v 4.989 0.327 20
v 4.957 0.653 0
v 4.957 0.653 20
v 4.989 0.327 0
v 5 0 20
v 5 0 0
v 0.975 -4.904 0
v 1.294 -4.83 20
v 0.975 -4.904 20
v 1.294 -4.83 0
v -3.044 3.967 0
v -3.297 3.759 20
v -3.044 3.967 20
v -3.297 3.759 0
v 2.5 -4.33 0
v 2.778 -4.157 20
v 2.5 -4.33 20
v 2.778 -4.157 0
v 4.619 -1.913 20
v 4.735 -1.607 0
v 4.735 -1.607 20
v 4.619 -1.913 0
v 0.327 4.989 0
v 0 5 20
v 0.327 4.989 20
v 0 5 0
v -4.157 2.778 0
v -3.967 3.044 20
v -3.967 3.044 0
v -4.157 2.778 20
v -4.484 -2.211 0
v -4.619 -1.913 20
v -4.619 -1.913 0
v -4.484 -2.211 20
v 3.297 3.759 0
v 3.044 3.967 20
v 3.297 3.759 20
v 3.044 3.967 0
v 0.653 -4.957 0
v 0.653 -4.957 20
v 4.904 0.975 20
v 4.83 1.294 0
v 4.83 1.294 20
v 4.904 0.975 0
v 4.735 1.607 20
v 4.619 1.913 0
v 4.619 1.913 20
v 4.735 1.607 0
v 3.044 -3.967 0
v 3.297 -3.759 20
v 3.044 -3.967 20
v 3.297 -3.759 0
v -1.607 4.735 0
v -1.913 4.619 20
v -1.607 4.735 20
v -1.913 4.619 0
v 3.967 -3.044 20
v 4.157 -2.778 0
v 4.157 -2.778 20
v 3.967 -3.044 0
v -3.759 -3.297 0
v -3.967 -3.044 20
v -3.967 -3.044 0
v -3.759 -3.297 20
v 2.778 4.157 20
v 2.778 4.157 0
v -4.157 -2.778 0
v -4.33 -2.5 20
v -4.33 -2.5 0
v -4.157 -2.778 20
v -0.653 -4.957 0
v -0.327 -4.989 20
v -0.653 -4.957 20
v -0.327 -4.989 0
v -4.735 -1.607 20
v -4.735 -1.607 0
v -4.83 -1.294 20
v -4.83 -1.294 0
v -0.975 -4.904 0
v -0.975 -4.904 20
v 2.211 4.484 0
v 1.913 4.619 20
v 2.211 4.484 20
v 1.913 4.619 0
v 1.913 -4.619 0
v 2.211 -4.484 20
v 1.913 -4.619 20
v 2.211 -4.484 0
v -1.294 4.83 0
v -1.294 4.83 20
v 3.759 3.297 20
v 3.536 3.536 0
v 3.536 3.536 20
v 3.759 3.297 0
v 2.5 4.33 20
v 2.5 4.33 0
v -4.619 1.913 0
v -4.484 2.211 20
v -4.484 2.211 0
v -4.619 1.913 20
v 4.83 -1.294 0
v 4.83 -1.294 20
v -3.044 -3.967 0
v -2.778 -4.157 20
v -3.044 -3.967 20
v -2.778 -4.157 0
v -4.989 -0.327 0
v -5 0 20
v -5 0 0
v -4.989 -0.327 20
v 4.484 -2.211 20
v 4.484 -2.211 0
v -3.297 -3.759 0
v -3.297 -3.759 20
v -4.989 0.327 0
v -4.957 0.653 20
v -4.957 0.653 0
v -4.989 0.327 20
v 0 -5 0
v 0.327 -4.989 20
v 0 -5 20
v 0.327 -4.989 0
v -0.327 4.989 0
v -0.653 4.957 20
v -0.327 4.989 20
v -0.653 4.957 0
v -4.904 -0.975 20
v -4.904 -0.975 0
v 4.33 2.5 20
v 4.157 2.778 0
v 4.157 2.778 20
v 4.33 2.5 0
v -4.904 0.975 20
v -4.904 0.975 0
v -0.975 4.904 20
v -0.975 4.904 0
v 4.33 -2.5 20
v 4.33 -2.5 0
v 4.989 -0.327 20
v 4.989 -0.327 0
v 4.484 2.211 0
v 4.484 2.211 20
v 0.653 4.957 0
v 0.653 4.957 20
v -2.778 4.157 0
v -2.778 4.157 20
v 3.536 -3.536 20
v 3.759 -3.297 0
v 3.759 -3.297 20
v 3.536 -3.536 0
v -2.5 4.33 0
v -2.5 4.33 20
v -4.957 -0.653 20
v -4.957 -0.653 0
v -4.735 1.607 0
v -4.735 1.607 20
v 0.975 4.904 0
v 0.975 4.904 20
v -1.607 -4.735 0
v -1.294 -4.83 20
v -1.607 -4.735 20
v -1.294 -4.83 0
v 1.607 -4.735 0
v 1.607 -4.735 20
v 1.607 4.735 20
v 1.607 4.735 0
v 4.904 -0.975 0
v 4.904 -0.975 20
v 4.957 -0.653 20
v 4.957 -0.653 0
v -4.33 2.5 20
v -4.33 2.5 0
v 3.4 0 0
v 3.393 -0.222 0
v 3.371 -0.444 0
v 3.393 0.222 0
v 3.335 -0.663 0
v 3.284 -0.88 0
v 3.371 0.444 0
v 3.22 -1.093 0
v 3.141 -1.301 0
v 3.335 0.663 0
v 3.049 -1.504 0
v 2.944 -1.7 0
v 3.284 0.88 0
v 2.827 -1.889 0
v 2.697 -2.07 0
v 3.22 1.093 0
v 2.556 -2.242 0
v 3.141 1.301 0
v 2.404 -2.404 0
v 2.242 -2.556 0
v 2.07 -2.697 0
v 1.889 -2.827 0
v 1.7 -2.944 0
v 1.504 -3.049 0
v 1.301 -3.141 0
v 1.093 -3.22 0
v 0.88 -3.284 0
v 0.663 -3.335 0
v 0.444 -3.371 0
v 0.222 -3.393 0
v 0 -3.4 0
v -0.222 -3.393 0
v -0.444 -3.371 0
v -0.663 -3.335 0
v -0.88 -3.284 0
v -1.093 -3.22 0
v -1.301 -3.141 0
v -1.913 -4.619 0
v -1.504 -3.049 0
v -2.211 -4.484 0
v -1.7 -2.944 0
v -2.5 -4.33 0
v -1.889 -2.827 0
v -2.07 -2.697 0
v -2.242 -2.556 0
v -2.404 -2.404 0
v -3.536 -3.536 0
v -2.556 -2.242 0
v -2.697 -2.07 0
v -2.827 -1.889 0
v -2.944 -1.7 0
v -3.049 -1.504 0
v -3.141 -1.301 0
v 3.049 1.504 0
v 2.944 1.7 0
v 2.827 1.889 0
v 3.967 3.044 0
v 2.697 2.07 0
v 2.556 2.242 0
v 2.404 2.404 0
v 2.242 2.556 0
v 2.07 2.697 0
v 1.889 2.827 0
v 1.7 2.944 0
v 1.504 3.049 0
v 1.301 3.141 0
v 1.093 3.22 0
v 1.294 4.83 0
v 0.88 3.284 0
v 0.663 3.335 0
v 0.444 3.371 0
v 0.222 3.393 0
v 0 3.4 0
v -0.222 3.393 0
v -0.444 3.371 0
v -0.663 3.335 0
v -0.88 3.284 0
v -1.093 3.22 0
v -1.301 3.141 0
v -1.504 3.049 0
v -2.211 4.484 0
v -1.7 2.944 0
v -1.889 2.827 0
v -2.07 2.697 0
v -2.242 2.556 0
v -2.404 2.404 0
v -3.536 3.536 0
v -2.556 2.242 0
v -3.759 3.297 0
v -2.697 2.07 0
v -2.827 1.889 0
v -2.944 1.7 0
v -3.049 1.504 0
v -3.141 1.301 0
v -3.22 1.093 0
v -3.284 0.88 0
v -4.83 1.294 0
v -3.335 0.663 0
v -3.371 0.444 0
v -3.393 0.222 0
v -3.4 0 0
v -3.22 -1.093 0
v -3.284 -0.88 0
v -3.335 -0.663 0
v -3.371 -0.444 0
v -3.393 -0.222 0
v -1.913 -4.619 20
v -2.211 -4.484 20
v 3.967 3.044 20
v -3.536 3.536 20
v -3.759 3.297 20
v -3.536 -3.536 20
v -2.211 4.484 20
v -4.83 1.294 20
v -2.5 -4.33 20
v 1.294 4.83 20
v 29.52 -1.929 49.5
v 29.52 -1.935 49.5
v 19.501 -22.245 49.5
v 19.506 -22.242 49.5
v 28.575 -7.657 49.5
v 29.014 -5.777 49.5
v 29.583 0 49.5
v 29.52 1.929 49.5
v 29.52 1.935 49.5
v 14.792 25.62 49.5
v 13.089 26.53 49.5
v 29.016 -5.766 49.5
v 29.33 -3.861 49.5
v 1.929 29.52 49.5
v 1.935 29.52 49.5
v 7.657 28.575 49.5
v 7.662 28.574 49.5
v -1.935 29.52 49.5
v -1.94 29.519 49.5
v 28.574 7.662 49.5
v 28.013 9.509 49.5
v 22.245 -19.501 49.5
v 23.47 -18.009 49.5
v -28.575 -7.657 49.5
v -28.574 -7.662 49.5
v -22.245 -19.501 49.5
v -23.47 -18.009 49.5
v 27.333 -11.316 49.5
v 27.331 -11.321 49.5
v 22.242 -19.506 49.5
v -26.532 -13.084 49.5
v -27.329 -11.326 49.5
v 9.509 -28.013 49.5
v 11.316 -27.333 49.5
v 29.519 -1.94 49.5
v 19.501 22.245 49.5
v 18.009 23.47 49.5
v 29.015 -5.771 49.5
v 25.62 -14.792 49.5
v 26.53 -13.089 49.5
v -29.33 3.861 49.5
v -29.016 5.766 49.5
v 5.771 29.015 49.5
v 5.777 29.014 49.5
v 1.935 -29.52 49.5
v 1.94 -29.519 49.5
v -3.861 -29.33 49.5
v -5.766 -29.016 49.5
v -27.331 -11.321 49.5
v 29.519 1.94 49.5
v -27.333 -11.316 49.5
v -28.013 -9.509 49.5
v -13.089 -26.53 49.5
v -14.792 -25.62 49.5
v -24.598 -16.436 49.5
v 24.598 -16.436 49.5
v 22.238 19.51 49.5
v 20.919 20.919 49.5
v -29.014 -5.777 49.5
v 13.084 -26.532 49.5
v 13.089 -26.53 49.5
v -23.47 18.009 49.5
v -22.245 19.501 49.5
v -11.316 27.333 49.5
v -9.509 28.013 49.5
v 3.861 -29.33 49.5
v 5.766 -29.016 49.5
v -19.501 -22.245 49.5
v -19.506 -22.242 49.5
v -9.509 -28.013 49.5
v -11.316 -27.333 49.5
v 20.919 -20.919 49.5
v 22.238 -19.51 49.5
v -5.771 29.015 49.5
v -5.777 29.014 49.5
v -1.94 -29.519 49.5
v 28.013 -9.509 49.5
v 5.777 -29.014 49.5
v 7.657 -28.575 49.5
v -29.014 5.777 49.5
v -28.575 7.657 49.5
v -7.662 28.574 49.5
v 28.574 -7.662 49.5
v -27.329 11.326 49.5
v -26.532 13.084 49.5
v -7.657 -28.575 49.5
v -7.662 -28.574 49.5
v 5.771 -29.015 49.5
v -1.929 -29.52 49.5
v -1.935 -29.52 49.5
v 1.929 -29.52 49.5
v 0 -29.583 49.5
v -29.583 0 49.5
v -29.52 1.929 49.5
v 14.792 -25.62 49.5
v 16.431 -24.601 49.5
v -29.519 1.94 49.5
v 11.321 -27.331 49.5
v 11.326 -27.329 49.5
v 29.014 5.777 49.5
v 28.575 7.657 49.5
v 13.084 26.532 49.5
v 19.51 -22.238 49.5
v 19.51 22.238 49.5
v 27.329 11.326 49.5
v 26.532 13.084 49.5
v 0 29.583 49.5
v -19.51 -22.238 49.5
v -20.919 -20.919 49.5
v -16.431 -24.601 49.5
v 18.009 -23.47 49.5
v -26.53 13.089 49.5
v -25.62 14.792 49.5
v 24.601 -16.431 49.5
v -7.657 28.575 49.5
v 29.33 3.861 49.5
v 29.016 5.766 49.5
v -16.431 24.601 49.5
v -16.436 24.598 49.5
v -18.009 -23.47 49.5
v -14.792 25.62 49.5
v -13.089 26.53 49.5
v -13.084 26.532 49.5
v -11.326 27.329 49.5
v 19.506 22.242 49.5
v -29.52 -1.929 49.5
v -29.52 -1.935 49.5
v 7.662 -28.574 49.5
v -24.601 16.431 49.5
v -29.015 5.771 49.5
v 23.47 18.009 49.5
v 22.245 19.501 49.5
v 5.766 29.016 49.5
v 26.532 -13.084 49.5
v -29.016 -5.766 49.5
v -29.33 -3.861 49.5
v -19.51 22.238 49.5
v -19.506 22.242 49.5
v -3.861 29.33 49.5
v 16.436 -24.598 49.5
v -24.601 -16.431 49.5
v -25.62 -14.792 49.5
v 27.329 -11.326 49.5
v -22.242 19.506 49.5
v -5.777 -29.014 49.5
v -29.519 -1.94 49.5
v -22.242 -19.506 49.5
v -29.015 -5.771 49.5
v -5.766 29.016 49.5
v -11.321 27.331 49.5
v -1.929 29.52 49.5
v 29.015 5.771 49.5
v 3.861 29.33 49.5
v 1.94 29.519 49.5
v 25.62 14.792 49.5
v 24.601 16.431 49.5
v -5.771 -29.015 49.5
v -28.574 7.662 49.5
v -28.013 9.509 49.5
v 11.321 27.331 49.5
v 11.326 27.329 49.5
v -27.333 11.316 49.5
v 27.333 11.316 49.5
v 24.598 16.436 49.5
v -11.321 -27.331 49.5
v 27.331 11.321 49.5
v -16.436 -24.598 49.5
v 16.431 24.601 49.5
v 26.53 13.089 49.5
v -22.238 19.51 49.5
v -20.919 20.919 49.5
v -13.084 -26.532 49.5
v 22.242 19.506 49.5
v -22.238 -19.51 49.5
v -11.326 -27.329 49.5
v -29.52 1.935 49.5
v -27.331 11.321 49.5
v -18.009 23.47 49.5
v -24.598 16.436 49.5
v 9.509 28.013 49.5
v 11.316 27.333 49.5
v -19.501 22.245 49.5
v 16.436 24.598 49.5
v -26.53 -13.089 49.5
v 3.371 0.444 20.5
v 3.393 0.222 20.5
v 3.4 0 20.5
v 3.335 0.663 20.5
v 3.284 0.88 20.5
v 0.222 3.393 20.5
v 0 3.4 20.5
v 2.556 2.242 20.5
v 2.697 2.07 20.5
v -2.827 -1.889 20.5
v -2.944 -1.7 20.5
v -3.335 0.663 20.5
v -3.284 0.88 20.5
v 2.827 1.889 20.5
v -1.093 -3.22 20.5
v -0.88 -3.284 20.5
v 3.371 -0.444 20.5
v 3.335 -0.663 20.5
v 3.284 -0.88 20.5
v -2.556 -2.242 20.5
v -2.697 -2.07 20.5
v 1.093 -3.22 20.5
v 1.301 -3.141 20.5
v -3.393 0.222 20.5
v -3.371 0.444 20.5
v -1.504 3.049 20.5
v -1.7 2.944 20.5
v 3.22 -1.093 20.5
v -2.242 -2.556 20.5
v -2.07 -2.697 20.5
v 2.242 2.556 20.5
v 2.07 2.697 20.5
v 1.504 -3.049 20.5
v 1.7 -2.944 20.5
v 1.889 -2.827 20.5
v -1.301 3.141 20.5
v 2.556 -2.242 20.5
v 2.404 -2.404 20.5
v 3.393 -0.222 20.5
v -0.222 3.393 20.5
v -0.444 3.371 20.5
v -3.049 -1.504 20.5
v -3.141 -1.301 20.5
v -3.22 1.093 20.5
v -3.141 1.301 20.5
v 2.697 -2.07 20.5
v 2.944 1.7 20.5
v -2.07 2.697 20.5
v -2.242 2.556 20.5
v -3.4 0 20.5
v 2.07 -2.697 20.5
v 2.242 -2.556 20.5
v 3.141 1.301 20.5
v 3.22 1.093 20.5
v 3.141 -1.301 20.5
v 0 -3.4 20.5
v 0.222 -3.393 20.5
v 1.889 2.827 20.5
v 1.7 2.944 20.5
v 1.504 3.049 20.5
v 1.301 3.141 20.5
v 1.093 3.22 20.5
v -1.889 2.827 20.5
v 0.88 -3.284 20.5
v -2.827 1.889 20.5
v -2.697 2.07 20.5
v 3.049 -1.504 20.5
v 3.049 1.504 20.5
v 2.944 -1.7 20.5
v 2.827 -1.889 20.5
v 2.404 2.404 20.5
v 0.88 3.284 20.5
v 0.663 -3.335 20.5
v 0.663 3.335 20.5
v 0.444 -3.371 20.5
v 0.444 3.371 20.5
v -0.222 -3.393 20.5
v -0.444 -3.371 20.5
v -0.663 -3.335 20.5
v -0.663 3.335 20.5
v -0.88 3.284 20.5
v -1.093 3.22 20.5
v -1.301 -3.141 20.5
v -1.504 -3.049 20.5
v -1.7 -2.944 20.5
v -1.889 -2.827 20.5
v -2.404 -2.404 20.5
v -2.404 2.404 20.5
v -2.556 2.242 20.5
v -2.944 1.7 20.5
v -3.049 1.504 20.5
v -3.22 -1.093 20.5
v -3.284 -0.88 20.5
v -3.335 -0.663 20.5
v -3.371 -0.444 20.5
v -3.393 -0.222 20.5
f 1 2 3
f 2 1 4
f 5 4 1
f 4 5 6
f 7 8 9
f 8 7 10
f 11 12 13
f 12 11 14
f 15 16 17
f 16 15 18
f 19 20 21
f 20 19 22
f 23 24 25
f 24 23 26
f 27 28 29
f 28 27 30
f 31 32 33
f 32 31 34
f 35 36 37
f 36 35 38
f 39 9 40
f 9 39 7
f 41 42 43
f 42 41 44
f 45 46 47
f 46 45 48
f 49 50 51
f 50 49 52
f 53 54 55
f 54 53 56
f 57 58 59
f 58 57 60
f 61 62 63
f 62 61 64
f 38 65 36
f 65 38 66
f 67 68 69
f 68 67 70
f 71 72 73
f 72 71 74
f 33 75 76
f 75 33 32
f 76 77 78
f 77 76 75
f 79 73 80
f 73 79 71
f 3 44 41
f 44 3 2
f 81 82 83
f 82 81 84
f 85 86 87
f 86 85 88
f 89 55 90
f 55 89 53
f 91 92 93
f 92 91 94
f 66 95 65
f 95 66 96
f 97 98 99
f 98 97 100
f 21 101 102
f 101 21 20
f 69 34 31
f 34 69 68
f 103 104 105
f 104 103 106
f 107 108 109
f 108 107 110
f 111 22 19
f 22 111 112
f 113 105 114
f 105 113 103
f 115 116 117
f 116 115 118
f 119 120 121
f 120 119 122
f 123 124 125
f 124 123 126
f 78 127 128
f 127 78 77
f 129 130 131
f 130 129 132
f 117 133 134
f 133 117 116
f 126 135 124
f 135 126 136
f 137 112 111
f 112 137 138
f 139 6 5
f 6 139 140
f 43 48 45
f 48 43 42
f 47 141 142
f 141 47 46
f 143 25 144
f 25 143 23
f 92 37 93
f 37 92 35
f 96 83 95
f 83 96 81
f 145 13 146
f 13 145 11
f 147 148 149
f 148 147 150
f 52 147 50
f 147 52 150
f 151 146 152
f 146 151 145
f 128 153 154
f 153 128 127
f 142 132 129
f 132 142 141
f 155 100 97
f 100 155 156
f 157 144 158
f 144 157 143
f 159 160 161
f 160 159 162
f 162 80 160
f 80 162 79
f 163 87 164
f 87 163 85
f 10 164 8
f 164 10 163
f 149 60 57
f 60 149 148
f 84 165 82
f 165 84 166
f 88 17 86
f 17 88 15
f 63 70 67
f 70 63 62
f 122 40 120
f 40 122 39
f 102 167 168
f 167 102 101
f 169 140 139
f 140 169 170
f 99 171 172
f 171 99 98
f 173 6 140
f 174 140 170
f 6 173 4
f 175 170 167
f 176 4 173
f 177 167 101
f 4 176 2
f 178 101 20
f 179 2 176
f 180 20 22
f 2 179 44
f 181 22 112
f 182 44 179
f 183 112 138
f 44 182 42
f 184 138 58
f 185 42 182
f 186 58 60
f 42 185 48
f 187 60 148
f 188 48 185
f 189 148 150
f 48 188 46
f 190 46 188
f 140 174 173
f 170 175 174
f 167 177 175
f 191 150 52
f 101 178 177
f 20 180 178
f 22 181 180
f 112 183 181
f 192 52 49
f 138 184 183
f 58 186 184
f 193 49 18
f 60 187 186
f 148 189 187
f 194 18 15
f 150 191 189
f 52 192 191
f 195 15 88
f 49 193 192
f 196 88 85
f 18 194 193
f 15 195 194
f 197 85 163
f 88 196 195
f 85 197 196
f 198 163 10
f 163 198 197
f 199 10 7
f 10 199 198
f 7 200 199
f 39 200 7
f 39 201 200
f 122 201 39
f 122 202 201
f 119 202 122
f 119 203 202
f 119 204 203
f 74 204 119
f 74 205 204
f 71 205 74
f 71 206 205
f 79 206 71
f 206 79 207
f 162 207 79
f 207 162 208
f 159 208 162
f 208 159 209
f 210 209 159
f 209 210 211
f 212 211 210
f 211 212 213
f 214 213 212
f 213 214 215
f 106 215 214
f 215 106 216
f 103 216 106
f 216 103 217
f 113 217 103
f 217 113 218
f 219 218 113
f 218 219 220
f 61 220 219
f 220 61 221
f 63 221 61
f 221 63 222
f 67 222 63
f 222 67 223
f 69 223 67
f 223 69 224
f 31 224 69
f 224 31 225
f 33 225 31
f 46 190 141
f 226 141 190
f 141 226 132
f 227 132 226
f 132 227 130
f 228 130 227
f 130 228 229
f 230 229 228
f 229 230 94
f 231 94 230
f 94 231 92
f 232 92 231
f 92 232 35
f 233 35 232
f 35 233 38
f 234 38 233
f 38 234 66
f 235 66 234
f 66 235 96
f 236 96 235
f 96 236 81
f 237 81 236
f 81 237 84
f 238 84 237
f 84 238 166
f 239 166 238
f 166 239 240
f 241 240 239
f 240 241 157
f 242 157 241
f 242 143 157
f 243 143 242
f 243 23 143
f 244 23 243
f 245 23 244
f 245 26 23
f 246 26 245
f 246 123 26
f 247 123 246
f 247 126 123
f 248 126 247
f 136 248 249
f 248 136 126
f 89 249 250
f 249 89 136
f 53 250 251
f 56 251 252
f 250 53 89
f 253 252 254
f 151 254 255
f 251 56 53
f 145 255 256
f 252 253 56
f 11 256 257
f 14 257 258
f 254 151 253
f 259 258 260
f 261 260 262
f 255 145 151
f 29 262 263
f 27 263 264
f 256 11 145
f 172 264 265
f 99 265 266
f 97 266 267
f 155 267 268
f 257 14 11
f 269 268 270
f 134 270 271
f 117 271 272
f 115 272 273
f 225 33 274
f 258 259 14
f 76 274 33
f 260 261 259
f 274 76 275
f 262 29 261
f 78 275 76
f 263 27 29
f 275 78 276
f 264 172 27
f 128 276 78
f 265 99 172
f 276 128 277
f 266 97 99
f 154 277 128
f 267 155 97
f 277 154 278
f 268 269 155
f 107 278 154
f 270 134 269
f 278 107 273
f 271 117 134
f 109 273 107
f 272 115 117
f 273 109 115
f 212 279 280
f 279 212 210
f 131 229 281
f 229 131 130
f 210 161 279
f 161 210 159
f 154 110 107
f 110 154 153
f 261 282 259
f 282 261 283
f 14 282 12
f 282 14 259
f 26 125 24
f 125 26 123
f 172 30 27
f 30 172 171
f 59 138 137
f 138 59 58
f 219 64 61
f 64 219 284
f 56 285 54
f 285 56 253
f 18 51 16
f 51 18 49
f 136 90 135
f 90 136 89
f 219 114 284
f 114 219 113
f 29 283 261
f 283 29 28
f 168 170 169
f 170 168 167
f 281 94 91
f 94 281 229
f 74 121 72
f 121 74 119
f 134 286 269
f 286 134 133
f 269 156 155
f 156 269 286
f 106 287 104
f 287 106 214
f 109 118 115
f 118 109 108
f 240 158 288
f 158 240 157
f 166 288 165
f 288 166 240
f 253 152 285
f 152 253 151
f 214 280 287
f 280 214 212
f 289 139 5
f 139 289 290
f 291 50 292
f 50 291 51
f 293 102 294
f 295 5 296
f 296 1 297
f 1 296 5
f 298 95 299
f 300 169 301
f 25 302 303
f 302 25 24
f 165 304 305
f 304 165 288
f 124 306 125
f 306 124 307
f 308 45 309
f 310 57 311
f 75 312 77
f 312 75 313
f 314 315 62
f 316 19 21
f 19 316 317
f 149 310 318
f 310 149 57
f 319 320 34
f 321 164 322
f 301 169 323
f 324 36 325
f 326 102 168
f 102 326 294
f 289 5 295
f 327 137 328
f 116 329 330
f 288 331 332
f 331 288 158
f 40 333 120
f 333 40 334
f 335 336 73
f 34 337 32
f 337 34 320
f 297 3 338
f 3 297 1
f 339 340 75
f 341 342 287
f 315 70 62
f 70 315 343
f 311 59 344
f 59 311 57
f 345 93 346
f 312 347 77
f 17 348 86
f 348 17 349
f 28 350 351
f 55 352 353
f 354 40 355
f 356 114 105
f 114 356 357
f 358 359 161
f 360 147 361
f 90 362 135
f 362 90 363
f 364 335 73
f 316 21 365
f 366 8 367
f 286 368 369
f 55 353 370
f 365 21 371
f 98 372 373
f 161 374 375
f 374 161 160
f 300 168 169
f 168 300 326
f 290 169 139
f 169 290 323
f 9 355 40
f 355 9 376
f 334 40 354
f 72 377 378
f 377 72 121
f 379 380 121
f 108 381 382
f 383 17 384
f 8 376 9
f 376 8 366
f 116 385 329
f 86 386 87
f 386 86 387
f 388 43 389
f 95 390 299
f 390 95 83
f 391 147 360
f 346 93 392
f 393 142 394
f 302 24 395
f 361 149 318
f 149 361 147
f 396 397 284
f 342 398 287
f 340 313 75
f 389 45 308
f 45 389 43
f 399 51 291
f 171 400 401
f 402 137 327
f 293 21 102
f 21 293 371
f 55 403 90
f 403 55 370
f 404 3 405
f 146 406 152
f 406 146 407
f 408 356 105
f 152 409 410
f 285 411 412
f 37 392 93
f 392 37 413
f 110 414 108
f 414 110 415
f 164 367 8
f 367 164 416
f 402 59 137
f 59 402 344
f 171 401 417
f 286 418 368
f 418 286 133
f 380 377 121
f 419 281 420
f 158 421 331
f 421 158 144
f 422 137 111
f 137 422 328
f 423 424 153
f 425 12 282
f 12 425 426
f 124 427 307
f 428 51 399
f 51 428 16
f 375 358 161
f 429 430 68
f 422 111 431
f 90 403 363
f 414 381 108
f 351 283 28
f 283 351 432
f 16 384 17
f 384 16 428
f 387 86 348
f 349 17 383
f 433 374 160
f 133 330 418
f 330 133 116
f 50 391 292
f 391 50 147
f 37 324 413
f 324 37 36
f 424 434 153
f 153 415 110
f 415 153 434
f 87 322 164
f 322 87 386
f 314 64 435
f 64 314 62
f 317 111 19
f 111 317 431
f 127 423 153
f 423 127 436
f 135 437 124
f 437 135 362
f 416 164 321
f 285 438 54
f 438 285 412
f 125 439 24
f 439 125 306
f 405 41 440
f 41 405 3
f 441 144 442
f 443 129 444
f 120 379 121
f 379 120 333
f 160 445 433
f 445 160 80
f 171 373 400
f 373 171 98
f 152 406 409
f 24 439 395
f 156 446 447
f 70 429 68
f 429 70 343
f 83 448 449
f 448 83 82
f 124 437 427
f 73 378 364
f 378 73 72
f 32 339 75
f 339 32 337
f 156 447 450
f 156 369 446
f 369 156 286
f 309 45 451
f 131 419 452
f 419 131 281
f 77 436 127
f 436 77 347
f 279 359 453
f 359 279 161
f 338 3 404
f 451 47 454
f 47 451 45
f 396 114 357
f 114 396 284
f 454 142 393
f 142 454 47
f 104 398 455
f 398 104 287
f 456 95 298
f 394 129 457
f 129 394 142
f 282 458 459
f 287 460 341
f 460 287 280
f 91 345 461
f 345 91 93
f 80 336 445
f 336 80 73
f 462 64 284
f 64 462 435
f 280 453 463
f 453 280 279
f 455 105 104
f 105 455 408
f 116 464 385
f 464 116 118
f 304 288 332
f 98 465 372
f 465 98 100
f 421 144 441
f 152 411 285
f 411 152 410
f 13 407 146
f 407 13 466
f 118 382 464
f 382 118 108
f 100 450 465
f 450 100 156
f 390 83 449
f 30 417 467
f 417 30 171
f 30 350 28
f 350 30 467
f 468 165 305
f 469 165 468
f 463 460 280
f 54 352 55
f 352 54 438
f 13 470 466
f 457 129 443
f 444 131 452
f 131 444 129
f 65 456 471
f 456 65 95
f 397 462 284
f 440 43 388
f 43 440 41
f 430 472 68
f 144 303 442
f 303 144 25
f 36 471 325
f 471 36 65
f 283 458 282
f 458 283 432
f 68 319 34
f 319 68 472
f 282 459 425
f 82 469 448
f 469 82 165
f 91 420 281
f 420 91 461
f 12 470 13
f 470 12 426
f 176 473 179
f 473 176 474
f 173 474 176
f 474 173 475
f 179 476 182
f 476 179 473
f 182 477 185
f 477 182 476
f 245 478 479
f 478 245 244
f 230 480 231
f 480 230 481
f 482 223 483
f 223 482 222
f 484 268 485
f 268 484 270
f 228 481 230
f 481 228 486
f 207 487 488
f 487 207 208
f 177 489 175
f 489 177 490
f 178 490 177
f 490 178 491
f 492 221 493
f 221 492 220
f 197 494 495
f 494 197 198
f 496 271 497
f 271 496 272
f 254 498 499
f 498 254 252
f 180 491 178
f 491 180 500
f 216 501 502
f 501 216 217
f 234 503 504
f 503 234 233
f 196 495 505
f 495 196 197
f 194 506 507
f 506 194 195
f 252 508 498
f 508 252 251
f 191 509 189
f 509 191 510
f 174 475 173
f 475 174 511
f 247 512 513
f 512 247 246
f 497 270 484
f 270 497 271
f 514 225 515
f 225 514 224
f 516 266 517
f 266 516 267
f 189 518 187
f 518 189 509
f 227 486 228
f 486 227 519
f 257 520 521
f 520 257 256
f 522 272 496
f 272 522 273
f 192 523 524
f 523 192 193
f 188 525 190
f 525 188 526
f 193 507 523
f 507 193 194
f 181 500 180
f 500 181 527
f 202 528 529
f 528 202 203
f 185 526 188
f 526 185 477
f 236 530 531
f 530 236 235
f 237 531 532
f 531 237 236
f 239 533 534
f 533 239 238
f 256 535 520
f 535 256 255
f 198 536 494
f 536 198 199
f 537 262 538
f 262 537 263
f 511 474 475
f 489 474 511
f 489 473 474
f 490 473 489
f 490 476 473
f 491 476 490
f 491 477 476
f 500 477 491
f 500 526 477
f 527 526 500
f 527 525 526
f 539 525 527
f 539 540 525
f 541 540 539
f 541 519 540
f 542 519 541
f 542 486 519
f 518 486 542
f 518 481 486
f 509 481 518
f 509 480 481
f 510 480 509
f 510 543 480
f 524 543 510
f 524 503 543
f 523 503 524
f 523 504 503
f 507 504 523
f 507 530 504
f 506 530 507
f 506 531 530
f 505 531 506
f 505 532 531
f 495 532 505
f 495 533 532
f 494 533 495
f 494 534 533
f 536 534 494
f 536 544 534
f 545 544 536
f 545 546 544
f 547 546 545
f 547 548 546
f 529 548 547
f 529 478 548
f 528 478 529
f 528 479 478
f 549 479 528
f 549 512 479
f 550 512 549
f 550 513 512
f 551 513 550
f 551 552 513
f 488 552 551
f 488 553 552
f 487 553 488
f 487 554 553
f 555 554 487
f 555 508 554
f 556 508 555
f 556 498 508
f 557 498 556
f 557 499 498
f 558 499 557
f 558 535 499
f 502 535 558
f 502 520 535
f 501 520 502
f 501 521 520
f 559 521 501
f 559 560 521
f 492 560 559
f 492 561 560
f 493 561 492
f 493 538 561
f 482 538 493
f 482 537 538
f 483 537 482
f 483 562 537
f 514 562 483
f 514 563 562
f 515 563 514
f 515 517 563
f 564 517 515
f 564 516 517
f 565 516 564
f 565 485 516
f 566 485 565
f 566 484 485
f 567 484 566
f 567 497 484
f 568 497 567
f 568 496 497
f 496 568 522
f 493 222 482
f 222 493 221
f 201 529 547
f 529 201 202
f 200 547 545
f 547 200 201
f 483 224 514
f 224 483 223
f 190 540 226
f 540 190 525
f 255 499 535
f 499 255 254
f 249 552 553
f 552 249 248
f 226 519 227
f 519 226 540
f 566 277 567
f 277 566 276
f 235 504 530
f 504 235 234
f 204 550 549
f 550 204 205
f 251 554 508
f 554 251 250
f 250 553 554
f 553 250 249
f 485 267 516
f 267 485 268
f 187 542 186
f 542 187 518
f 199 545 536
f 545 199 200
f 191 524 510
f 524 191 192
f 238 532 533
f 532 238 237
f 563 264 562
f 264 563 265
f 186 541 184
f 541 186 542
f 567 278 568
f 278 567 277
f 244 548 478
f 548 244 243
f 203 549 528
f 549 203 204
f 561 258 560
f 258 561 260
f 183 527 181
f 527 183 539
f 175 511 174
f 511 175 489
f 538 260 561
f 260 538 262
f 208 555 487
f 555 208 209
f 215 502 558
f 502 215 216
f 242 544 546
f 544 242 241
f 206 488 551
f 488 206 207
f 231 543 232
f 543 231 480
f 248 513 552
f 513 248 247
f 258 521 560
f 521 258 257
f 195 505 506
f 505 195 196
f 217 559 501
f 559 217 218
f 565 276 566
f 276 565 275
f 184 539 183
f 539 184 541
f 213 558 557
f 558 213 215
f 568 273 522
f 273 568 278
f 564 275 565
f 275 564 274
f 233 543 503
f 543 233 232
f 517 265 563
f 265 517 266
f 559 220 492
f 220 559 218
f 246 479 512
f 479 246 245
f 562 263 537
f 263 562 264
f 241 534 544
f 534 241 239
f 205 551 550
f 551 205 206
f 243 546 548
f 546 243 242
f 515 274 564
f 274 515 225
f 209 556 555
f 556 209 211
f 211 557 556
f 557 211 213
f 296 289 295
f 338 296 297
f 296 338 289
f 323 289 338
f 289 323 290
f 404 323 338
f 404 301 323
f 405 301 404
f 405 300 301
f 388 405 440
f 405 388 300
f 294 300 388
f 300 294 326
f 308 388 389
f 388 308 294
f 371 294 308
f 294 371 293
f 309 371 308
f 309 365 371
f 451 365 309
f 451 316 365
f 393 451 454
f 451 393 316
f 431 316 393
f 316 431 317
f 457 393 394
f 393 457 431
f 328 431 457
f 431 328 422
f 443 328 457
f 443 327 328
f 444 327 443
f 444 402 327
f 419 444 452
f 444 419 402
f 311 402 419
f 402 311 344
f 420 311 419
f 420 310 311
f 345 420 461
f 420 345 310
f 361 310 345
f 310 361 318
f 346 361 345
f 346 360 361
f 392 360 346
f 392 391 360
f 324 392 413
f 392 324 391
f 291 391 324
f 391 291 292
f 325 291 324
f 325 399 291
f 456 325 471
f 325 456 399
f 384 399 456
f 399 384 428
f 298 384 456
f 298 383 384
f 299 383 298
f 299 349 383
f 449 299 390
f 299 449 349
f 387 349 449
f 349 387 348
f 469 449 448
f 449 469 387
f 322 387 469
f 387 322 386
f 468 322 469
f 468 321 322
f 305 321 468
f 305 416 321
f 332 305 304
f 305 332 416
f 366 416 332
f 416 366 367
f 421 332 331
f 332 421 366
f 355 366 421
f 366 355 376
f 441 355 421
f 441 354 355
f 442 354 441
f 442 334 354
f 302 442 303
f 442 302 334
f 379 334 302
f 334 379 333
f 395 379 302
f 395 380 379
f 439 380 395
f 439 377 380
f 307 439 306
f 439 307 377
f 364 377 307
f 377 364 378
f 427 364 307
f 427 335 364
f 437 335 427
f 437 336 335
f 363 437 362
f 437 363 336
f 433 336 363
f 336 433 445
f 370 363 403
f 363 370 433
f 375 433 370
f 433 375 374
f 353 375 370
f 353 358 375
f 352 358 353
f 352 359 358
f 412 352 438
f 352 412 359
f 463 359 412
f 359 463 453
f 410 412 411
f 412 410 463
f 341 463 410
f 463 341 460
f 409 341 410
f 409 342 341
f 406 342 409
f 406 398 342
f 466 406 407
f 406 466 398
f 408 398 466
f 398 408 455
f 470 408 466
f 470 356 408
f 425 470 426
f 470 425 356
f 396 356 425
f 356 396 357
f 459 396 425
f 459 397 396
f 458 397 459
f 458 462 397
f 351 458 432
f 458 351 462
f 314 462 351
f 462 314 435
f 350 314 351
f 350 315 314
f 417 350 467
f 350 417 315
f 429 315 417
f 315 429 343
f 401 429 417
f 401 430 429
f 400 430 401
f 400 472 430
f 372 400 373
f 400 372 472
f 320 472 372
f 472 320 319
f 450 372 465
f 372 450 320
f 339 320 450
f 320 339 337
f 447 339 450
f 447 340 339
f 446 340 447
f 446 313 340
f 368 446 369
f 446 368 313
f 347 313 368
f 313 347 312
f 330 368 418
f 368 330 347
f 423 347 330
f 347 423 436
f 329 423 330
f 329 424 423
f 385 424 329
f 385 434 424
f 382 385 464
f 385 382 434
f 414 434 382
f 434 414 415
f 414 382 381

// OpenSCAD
// Lab funnel - printed upright, open at top and bottom
// Units: mm

$fn = 96;

// --- Dimensions ---
spout_od      = 10;    // spout outer diameter
spout_id      = spout_od - 2 * 1.6;  // spout bore (6.8 mm)
spout_h       = 20;    // spout height (z = 0 to 20)
cone_bottom_d = spout_od;  // cone starts at spout diameter
cone_top_d    = 60;    // cone rim diameter
cone_h        = 30;    // cone height (z = 20 to 50)
wall          = 1.6;   // wall thickness
eps           = 0.5;   // cutter overshoot

difference() {
    union() {
        // Spout
        cylinder(d = spout_od, h = spout_h);
        // Cone
        translate([0, 0, spout_h])
            cylinder(d1 = cone_bottom_d, d2 = cone_top_d, h = cone_h);
    }
    // Bottom cutter (through spout)
    translate([0, 0, -eps])
        cylinder(d = spout_id, h = spout_h + 2 * eps);
    // Top cutter (open rim)
    translate([0, 0, spout_h + cone_h - eps])
        cylinder(d = cone_top_d, h = eps);
}
